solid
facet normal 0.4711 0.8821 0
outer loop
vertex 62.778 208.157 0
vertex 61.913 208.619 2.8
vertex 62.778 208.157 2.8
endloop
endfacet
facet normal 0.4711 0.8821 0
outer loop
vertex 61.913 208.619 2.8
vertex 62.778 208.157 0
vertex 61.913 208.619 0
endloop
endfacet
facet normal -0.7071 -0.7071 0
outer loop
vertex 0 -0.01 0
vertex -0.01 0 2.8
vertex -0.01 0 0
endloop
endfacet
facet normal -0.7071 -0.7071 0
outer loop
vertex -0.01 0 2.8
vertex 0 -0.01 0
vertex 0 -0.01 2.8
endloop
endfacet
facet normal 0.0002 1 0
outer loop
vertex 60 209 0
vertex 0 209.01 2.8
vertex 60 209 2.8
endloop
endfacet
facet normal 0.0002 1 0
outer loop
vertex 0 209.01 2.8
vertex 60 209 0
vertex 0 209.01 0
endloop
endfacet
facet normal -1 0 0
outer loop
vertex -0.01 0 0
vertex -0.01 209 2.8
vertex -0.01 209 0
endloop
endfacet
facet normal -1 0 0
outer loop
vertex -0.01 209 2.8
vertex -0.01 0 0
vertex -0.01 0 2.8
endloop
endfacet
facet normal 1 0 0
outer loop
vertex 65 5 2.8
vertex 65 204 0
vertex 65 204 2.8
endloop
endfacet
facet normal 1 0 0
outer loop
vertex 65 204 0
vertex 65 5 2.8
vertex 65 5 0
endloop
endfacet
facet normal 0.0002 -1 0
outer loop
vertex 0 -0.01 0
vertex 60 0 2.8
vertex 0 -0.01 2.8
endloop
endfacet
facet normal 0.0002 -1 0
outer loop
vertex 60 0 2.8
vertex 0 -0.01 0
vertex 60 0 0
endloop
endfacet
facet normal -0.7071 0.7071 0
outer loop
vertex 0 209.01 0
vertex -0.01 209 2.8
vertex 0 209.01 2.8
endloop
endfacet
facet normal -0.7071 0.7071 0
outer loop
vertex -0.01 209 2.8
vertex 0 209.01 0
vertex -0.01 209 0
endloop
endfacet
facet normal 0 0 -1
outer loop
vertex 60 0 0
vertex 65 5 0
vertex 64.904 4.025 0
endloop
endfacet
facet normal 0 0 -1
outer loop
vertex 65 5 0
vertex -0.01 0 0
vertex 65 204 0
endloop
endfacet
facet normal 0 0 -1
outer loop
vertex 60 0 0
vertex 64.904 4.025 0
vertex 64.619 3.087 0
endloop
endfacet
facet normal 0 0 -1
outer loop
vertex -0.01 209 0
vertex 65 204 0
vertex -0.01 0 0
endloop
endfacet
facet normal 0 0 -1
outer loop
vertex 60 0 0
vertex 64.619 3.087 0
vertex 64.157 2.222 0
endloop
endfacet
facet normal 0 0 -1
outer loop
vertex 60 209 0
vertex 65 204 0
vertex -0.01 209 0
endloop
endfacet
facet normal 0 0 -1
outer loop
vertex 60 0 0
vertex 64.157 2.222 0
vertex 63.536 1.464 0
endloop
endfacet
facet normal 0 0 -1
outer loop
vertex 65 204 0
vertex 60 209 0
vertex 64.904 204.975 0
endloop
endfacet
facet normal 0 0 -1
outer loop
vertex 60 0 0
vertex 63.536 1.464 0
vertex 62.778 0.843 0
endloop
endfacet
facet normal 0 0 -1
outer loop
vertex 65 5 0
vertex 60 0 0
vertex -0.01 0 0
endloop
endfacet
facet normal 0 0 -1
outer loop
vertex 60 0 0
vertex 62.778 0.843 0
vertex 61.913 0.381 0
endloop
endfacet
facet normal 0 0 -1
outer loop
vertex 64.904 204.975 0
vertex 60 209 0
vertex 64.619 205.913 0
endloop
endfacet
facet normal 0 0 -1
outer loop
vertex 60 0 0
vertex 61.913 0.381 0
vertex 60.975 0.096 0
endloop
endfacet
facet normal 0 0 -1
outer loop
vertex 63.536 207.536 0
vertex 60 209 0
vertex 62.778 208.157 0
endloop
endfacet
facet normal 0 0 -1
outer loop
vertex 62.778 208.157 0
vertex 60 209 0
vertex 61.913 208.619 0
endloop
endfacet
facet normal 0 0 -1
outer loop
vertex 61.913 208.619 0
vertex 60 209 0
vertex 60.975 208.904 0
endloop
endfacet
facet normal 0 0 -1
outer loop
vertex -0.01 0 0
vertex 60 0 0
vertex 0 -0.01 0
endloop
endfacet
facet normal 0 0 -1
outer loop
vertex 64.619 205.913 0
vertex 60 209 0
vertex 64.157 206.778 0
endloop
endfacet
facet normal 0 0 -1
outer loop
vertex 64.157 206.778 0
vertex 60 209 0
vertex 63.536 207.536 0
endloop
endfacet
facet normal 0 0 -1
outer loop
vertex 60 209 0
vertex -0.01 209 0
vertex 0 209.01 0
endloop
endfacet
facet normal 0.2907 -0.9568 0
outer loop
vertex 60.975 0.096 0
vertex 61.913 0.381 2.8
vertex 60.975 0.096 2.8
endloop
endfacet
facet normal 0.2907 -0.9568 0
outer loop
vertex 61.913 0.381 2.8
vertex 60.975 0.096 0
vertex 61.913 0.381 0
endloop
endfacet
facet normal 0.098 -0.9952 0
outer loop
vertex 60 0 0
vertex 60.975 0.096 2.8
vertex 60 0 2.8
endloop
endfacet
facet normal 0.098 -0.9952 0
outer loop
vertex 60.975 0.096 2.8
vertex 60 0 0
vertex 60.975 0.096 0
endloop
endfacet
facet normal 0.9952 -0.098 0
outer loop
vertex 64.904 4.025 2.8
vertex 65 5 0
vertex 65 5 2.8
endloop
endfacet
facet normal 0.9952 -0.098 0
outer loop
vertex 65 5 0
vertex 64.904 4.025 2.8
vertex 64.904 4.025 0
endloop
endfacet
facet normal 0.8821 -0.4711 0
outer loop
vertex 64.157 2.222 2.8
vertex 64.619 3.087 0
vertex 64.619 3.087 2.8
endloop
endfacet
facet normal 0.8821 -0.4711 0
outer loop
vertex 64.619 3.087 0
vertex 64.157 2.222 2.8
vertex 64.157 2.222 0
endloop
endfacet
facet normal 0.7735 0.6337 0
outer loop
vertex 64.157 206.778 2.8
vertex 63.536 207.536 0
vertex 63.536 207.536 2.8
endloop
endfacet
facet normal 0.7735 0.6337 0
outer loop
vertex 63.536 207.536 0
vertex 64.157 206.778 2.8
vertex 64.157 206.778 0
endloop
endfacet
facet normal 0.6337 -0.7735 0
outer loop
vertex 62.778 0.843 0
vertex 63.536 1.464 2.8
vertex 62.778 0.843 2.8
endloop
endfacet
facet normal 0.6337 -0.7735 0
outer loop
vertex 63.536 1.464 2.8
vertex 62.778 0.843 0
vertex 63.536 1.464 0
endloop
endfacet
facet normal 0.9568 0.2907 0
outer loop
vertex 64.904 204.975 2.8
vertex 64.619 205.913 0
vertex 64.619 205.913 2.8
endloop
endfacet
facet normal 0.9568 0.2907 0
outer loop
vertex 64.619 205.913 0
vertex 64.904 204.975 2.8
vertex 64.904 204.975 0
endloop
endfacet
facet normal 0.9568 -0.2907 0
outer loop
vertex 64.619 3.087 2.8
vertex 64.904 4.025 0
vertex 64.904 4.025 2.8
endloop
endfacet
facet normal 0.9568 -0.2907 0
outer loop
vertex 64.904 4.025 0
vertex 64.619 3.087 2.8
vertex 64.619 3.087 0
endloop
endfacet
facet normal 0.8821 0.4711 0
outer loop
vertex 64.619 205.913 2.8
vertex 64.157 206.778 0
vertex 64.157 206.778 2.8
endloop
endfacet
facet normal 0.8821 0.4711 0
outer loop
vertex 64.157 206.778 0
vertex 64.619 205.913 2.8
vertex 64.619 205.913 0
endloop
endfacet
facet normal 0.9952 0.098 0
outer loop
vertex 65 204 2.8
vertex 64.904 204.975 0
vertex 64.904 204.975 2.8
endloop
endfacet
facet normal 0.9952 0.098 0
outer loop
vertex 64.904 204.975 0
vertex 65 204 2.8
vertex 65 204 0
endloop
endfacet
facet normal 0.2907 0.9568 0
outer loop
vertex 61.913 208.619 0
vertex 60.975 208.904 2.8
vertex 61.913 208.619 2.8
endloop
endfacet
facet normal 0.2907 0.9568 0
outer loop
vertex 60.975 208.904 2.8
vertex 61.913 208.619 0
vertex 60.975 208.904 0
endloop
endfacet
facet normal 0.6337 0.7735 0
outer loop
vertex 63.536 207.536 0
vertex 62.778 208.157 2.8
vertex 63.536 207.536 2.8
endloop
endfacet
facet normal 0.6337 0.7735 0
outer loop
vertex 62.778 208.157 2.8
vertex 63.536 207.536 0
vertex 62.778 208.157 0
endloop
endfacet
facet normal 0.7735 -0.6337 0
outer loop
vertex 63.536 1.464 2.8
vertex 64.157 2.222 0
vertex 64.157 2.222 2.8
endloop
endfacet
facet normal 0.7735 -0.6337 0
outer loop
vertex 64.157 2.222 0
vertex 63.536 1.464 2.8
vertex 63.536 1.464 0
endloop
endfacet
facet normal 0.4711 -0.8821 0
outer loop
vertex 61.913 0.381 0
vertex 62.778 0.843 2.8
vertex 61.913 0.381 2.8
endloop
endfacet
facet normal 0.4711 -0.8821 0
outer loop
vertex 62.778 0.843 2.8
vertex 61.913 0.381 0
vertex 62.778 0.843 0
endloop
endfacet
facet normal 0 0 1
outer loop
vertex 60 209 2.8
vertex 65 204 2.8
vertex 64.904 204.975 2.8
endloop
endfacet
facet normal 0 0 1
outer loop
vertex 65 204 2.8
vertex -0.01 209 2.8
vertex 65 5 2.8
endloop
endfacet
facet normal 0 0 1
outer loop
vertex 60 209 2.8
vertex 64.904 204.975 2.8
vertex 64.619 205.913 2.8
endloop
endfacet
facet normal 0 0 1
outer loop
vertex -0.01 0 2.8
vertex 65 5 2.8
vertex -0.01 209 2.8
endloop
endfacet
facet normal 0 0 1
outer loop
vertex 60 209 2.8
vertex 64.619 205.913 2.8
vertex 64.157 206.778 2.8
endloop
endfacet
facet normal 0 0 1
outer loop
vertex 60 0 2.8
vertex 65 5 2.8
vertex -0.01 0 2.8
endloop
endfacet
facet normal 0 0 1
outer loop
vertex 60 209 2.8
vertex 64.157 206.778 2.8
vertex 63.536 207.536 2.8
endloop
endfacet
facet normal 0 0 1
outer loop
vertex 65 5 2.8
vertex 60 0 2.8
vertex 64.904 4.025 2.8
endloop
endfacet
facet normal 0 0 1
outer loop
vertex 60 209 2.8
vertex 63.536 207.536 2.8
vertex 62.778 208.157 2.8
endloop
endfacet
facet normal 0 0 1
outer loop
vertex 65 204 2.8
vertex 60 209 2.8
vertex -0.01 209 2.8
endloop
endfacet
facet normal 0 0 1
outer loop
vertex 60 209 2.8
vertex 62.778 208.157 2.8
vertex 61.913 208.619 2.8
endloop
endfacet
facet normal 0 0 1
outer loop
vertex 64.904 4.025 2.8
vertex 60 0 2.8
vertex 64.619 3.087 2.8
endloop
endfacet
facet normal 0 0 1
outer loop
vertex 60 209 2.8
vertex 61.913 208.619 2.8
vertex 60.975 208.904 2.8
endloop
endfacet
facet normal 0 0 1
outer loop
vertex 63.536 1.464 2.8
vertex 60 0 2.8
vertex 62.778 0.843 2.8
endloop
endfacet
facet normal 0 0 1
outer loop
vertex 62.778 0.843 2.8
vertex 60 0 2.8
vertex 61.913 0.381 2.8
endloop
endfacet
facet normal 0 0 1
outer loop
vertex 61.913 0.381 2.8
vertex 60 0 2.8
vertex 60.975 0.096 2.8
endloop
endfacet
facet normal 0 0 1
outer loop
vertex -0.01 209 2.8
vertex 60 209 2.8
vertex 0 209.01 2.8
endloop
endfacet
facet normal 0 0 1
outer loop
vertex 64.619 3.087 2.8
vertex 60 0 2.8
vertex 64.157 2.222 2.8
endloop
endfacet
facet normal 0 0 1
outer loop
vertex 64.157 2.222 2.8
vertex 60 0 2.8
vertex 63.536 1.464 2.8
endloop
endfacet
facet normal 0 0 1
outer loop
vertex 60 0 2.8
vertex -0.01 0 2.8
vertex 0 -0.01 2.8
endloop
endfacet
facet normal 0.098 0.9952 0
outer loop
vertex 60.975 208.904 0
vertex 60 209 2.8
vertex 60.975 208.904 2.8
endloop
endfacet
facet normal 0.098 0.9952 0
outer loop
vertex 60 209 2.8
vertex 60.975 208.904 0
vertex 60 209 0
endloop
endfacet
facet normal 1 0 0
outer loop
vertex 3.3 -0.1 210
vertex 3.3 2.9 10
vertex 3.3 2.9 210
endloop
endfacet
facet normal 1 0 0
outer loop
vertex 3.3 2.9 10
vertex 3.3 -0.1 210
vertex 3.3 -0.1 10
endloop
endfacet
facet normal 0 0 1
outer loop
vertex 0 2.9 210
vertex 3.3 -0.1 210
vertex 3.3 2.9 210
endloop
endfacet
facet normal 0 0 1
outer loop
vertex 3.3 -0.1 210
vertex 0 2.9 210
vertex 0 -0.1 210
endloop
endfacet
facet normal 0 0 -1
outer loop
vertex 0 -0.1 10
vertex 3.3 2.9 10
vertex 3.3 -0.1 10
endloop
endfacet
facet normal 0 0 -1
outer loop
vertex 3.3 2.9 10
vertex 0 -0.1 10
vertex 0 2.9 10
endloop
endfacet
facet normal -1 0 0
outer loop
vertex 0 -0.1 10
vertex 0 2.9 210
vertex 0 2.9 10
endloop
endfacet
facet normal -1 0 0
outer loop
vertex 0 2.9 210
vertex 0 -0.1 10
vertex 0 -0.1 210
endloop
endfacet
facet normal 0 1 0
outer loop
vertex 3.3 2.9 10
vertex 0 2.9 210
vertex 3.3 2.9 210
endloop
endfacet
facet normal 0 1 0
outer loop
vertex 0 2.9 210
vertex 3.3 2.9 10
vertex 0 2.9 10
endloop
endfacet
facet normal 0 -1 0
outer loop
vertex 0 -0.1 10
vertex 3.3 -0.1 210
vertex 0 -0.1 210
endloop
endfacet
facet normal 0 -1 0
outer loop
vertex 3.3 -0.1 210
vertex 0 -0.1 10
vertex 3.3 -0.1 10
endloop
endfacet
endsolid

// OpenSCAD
// 滑槽拼接 - 方向2：前后方向
// B部分：65mm × 209mm × 2.8mm
// 滑舌从前向后

// 参数
width = 65;      // 宽度 (mm)
height = 209;    // 高度 (mm)
thickness = 2.8; // 厚度 (mm)
corner_radius = 5;  // 倒角半径 (mm)

// 滑槽参数（与A部分匹配）
slot_depth = 3.3;     // 滑舌长度 (mm，比槽长0.3mm)
slot_height = 2.8;    // 滑舌高度 (mm，等于厚度）
slot_length = 200;    // 滑舌长度 (mm)
slot_offset = 10;      // 滑舌距离边缘 (mm)
tolerance = 0.3;       // 配合公差

// 圆角矩形模块（左侧不倒角）
module rounded_rect_left_flat(w, h, r, t) {
    hull() {
        translate([0, 0, 0]) cylinder(h = t, r = 0.01, $fn = 4);
        translate([0, h, 0]) cylinder(h = t, r = 0.01, $fn = 4);
        translate([w - r, h - r, 0]) cylinder(h = t, r = r, $fn = 32);
        translate([w - r, r, 0]) cylinder(h = t, r = r, $fn = 32);
    }
}

// 创建主体
difference() {
    union() {
        // 面板主体
        color("LightGray") {
            rounded_rect_left_flat(width, height, corner_radius, thickness);
        }

        // 滑舌（在左侧，前后方向）
        color("Red") {
            translate([0, -0.1, slot_offset])
            cube([slot_depth, 3, slot_length]);
        }
    }
}

// 装配预览（打印时可注释掉）
/*
color("LightGray", 0.3)
translate([-slot_depth, 0, 0])
import("part_A_slot_frontback.stl");
*/
